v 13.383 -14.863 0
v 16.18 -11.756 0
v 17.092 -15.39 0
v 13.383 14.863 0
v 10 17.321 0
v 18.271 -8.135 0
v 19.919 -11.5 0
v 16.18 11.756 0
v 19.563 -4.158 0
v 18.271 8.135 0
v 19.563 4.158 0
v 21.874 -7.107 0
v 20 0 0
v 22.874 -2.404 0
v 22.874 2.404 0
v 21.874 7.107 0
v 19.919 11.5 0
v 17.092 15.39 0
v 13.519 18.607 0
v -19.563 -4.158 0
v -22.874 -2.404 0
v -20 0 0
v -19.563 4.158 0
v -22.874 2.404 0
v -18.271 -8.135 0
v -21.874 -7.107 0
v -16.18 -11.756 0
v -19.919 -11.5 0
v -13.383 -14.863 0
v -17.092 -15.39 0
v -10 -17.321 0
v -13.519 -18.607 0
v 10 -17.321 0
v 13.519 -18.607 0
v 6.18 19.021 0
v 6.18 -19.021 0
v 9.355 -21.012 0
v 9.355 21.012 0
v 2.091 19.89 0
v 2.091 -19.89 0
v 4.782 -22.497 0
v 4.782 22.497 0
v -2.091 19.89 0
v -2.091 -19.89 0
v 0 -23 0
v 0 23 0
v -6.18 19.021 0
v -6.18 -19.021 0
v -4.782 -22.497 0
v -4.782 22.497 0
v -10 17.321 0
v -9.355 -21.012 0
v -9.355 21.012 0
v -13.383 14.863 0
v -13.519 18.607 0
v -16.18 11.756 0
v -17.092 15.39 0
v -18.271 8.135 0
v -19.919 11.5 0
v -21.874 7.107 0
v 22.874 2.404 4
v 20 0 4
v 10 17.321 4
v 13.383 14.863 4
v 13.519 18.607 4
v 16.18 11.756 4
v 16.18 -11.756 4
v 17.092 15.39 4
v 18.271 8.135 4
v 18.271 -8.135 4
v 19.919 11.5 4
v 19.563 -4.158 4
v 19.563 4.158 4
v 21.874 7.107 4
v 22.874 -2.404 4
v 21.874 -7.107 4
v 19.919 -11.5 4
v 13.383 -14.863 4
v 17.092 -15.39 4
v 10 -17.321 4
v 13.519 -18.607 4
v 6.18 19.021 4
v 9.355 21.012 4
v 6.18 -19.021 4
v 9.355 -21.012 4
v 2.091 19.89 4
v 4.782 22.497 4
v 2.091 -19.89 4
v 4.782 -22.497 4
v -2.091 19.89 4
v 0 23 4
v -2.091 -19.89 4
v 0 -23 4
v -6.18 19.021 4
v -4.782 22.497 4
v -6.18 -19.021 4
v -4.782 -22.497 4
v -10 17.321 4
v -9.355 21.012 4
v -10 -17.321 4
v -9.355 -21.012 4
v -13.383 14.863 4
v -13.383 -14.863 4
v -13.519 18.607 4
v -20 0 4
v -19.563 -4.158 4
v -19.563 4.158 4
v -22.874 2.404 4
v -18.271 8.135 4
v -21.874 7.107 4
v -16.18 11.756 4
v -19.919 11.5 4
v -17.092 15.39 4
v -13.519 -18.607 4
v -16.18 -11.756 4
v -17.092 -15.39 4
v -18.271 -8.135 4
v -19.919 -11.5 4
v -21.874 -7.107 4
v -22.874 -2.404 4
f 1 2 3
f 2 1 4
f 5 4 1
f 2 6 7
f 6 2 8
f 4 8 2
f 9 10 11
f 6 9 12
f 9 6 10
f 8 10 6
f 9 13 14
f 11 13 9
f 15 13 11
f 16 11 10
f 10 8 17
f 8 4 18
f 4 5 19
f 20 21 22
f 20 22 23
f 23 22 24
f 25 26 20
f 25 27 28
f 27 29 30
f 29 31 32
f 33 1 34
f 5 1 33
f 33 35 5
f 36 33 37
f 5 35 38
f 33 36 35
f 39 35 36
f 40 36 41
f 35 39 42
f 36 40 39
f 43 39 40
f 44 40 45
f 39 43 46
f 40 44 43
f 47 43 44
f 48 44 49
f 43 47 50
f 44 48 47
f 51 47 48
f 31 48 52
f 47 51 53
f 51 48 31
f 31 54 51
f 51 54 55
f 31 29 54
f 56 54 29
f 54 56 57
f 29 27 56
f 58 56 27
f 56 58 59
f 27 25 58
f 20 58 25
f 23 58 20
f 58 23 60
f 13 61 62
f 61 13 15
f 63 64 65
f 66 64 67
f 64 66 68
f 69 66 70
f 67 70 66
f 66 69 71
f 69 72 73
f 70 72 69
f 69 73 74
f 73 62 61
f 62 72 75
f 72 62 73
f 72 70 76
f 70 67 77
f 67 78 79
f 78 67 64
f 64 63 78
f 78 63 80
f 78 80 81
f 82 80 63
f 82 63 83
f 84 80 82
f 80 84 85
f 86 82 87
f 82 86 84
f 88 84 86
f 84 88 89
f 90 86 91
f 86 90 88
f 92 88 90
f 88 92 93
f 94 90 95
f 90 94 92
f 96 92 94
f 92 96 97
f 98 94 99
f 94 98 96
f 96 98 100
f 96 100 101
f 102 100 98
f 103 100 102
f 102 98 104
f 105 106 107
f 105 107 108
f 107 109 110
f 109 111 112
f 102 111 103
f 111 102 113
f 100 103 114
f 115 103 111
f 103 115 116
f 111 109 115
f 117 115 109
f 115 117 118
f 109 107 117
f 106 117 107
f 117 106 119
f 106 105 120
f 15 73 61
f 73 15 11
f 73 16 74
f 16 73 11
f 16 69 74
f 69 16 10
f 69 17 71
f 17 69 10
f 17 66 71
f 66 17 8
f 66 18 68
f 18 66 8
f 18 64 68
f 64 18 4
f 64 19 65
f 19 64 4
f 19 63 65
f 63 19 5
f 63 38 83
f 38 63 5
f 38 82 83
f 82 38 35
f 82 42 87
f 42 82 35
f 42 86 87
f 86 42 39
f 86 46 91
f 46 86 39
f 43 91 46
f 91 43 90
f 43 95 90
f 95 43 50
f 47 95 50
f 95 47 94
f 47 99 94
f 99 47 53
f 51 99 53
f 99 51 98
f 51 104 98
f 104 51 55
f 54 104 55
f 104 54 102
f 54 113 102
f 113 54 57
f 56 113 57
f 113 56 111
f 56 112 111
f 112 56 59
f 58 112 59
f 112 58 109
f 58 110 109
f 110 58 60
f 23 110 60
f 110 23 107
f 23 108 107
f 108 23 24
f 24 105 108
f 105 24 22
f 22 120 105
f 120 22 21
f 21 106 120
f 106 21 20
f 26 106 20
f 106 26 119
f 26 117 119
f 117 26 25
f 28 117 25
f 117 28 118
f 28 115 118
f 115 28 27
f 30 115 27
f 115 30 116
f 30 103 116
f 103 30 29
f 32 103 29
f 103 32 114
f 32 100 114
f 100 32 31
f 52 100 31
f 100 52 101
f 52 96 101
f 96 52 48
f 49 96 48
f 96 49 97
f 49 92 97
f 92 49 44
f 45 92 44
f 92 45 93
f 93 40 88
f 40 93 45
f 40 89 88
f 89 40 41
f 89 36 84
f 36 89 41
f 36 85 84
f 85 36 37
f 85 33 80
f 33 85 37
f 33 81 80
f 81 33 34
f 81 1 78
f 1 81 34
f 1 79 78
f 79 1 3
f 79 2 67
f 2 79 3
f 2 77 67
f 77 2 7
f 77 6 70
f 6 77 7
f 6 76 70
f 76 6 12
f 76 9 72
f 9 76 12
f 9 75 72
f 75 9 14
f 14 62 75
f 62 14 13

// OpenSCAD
module gear(height, radius, teeth_depth, teeth=30) {
	cylinder(h=height, r=radius, $fn=teeth);
	for(tooth = [0:teeth]) {
		rotate([0, 0, tooth * 360 / teeth]) {
			linear_extrude(height=height) {
				polygon(points=[[radius, 0],[cos(360 / teeth) * radius, sin(360 / teeth) * radius], [cos(180 / teeth) * (radius + teeth_depth), sin(180 / teeth) * (radius + teeth_depth)]], convexity=1);
			}
		}
	}
}

gear(height=4, radius=20, teeth_depth=3);
